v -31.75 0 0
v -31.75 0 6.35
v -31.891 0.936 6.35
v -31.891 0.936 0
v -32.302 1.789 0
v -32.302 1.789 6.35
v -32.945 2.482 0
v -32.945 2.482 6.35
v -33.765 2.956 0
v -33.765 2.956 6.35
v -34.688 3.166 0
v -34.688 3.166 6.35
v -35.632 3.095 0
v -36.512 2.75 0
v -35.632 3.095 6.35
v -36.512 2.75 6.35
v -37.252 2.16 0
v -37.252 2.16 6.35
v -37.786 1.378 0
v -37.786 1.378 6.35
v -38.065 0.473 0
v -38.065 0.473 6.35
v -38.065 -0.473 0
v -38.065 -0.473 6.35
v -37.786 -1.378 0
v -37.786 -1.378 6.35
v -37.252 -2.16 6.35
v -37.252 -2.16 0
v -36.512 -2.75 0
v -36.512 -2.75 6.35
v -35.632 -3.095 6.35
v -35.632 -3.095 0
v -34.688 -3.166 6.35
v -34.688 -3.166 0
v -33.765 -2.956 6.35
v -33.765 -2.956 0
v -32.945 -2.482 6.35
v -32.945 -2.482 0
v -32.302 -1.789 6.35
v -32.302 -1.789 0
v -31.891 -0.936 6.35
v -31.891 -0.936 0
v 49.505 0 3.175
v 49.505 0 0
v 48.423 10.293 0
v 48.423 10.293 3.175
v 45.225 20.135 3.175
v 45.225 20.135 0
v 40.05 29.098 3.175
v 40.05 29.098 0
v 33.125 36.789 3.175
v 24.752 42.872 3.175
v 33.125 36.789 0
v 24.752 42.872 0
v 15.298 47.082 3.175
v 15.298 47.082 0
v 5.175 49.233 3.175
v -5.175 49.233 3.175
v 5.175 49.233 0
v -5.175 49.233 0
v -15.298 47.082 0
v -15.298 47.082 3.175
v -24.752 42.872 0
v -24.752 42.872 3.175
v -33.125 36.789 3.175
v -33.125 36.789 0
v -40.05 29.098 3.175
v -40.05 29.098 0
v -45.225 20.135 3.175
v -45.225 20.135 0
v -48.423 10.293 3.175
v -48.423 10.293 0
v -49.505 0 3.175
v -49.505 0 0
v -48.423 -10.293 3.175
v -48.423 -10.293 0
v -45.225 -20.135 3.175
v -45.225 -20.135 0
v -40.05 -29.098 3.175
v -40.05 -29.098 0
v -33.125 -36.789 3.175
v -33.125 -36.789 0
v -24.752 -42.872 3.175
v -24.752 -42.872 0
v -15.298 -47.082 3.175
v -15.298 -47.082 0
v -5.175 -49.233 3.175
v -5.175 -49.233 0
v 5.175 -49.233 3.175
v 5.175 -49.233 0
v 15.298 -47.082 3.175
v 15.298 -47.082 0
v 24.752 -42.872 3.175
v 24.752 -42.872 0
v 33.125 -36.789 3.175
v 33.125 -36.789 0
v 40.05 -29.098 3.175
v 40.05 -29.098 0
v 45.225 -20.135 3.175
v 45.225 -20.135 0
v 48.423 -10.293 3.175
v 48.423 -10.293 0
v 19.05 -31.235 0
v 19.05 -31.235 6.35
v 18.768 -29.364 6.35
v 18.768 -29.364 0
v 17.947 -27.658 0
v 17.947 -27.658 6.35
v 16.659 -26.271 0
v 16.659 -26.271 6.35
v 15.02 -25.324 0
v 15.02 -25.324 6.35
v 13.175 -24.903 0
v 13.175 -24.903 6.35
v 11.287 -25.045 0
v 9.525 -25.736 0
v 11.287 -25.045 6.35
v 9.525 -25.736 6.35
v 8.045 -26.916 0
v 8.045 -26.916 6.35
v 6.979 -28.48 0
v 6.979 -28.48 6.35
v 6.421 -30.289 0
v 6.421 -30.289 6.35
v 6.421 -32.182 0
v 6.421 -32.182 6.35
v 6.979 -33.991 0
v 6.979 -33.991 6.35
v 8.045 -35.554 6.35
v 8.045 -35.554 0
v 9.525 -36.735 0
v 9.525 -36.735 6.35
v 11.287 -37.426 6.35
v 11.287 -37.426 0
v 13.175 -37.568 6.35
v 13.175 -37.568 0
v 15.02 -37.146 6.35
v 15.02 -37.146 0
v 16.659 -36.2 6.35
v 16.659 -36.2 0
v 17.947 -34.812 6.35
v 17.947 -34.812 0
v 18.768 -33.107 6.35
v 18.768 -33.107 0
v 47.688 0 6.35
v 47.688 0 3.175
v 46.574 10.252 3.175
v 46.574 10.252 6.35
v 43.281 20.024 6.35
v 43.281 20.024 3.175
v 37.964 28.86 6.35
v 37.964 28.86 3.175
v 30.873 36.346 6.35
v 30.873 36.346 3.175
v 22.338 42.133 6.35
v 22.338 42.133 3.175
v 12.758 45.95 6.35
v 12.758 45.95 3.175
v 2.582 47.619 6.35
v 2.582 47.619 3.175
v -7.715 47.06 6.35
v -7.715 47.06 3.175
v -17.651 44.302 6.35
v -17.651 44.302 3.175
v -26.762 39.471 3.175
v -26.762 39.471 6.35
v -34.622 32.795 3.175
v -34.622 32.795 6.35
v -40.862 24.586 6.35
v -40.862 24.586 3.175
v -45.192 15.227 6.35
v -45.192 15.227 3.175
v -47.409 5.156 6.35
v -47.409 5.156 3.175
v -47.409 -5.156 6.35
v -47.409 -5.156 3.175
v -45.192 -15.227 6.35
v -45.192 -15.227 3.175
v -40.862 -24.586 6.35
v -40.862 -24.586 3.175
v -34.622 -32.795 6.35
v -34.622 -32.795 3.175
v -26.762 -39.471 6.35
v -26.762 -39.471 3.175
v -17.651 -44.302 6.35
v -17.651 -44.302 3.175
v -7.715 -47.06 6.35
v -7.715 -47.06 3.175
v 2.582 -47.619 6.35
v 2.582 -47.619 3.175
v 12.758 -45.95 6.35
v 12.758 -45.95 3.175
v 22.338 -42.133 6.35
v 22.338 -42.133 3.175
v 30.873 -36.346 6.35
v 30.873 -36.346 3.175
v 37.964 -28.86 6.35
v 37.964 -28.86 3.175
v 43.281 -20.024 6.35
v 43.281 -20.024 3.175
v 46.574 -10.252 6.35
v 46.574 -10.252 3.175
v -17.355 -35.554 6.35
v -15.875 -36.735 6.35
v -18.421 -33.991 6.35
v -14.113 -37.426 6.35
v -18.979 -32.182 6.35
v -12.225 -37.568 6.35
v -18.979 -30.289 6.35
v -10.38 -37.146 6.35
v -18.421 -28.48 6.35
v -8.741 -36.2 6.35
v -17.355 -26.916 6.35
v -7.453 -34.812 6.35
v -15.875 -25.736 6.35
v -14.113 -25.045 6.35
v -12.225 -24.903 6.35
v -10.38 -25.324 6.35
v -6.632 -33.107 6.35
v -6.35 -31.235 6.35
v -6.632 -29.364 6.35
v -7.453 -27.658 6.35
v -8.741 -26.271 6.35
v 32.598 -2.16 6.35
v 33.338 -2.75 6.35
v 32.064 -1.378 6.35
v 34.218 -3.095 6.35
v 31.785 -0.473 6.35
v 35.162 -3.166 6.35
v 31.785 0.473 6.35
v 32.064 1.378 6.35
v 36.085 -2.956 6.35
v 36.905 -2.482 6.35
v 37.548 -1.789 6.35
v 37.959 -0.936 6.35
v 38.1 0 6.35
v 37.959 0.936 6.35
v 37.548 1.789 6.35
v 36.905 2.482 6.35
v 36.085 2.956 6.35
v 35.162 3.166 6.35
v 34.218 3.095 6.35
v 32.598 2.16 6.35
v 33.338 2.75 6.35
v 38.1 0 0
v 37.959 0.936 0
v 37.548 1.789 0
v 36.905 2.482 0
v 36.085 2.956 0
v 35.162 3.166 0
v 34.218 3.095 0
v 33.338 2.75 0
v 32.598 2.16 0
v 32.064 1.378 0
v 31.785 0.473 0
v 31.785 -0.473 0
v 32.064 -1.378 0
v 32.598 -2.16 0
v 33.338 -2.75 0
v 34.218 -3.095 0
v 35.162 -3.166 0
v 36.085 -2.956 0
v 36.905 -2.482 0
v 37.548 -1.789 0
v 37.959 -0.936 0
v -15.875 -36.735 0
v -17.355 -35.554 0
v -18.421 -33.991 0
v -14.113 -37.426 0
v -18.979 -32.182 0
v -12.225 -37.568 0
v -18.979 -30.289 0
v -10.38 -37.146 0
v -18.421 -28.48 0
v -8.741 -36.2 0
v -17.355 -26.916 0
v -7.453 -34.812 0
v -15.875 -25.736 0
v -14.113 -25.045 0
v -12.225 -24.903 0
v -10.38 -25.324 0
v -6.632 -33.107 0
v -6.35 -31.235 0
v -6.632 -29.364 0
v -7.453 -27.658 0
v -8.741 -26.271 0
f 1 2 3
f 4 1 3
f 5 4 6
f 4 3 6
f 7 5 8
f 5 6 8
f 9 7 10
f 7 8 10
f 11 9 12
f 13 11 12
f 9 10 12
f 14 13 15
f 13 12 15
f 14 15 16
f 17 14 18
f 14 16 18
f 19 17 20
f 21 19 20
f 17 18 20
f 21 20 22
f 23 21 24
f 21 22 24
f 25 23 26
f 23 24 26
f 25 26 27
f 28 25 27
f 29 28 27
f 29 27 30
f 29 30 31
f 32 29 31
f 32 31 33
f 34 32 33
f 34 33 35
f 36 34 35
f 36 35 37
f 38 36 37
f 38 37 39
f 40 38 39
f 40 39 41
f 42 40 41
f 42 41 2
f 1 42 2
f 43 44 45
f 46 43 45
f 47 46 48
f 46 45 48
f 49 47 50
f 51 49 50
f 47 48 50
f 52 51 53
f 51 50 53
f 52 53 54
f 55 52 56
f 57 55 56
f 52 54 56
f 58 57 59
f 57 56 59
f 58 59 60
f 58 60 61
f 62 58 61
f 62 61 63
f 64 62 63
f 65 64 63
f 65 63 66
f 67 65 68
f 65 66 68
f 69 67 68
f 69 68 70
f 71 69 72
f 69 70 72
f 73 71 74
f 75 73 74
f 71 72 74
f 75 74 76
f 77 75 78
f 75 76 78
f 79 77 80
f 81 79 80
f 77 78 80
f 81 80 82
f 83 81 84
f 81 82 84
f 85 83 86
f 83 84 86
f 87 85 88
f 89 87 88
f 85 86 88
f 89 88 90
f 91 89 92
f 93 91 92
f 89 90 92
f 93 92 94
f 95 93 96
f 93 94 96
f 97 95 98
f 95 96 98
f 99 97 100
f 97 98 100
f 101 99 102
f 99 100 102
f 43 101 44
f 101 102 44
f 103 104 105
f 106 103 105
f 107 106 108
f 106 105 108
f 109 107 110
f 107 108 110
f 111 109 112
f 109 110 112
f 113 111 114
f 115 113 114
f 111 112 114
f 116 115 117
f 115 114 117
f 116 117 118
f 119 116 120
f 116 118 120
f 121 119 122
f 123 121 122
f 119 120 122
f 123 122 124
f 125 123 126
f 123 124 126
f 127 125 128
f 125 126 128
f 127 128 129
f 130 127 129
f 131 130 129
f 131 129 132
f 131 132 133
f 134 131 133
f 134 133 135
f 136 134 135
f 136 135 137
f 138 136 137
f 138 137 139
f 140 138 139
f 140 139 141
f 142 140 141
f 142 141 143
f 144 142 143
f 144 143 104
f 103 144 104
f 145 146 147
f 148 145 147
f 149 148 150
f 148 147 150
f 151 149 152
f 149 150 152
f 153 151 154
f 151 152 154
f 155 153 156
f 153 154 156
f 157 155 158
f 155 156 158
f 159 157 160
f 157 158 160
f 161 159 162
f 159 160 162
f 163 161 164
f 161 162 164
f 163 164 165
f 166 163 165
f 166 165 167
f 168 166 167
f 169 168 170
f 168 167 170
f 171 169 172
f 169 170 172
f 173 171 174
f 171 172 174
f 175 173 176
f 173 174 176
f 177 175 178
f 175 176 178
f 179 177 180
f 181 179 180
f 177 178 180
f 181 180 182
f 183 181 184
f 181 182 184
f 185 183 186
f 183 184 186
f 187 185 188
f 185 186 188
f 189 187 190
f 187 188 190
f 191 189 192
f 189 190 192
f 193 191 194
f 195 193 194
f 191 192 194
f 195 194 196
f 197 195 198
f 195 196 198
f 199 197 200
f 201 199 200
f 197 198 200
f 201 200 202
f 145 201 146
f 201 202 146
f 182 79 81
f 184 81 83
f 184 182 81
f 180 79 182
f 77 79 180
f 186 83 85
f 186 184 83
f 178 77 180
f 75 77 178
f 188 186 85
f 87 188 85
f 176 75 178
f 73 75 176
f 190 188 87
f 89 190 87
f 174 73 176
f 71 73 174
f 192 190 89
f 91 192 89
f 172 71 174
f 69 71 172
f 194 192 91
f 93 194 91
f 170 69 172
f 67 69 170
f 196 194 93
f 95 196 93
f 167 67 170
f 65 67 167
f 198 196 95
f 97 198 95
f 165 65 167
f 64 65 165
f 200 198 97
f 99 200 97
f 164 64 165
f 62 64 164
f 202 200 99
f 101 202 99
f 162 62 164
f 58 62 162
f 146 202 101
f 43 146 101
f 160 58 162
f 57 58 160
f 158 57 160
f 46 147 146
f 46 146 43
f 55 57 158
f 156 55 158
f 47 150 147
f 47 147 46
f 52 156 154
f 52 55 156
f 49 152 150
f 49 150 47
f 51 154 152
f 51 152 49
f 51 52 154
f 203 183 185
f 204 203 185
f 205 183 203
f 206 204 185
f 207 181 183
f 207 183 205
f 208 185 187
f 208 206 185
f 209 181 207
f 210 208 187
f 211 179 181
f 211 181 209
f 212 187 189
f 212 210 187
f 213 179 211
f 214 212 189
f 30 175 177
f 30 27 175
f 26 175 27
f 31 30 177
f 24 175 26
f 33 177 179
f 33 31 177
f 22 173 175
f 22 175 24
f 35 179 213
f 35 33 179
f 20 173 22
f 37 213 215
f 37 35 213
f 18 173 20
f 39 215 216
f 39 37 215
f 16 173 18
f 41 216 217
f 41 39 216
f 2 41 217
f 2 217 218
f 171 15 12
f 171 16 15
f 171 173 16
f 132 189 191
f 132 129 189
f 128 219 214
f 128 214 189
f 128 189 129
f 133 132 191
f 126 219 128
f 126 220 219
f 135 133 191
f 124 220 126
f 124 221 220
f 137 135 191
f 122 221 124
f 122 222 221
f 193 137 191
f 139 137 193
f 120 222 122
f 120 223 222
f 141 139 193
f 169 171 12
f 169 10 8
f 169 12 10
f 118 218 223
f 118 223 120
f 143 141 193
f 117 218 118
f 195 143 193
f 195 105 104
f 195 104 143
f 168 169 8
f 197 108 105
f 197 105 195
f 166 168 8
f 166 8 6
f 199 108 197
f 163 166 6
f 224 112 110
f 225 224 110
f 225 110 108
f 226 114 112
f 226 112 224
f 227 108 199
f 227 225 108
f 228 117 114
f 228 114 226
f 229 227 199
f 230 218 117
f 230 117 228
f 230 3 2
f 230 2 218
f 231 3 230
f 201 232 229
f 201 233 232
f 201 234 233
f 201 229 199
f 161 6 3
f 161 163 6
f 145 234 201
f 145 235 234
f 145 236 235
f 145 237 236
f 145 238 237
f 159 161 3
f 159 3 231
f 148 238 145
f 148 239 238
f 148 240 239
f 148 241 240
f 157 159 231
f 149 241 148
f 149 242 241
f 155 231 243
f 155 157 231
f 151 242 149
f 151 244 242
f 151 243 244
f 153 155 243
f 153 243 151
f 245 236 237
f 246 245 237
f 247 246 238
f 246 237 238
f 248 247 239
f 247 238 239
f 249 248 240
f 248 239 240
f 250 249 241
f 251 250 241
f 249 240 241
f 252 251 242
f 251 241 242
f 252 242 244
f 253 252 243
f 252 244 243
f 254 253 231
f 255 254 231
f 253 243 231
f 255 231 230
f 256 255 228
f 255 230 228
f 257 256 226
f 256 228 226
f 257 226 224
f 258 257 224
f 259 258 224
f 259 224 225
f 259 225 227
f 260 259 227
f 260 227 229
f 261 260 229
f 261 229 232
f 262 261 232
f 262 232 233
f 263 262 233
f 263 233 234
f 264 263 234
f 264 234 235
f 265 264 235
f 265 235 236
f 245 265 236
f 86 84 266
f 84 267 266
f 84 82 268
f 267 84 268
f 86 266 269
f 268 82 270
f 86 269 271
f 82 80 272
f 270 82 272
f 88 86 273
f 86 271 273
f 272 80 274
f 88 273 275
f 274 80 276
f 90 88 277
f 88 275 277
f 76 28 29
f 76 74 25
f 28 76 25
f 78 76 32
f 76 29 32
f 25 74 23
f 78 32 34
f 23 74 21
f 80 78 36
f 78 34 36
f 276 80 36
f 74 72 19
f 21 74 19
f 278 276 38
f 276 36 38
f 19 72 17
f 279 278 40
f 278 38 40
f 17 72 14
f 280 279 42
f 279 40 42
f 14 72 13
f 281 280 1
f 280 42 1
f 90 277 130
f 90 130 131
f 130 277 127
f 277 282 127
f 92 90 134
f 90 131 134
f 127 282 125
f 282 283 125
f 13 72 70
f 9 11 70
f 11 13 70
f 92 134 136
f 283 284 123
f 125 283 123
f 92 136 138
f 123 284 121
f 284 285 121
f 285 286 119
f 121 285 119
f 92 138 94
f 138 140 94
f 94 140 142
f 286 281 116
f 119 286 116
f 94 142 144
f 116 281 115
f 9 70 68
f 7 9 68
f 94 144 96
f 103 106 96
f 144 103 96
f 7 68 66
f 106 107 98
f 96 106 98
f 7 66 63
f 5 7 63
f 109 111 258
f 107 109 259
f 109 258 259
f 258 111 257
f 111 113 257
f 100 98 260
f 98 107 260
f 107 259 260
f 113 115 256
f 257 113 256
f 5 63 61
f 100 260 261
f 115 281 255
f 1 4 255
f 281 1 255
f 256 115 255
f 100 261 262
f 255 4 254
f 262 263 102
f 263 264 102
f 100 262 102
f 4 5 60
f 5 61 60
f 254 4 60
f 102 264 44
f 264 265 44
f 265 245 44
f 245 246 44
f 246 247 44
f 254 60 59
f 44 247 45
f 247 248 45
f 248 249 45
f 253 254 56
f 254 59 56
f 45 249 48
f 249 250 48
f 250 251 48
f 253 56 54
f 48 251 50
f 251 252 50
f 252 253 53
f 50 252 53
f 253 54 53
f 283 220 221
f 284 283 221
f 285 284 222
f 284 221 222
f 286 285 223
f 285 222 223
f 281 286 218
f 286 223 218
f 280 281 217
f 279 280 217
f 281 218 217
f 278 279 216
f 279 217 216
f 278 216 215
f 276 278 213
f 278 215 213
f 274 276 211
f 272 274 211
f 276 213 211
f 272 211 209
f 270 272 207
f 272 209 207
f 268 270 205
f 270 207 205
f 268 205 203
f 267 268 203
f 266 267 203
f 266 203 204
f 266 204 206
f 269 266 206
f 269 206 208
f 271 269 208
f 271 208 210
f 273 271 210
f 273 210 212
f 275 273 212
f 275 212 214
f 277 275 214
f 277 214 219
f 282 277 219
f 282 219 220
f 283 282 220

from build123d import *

# Parameters (mm, degrees)
SKETCH1_R           = 49.5046
BOSS_EXTRUDE1_DEPTH = 3.175
SKETCH2_R           = 47.6885
BOSS_EXTRUDE2_DEPTH = 3.175
SKETCH3_R           = 6.35
SKETCH3_R_2         = 3.175
CUT_EXTRUDE1_DEPTH  = 71.297463271


with BuildPart() as part:
    # Sketch1 → Boss-Extrude1 (new body)
    with BuildSketch(Plane.XY):
        Circle(SKETCH1_R)
    extrude(amount=BOSS_EXTRUDE1_DEPTH)

    # Sketch2 → Boss-Extrude2 (add)
    with BuildSketch(Plane.XY.offset(3.175)):
        Circle(SKETCH2_R)
    extrude(amount=BOSS_EXTRUDE2_DEPTH)

    # Sketch3 → Cut-Extrude1 (cut, through all)
    with BuildSketch(Plane.XY.offset(6.35)):
        with Locations((-12.7, -31.235352443)):
            Circle(SKETCH3_R)
        with Locations((12.7, -31.235352443)):
            Circle(SKETCH3_R)
        with Locations((-34.925, 0)):
            Circle(SKETCH3_R_2)
        with Locations((34.925, 0)):
            Circle(SKETCH3_R_2)
    extrude(amount=-CUT_EXTRUDE1_DEPTH, mode=Mode.SUBTRACT)


solid = part.part
